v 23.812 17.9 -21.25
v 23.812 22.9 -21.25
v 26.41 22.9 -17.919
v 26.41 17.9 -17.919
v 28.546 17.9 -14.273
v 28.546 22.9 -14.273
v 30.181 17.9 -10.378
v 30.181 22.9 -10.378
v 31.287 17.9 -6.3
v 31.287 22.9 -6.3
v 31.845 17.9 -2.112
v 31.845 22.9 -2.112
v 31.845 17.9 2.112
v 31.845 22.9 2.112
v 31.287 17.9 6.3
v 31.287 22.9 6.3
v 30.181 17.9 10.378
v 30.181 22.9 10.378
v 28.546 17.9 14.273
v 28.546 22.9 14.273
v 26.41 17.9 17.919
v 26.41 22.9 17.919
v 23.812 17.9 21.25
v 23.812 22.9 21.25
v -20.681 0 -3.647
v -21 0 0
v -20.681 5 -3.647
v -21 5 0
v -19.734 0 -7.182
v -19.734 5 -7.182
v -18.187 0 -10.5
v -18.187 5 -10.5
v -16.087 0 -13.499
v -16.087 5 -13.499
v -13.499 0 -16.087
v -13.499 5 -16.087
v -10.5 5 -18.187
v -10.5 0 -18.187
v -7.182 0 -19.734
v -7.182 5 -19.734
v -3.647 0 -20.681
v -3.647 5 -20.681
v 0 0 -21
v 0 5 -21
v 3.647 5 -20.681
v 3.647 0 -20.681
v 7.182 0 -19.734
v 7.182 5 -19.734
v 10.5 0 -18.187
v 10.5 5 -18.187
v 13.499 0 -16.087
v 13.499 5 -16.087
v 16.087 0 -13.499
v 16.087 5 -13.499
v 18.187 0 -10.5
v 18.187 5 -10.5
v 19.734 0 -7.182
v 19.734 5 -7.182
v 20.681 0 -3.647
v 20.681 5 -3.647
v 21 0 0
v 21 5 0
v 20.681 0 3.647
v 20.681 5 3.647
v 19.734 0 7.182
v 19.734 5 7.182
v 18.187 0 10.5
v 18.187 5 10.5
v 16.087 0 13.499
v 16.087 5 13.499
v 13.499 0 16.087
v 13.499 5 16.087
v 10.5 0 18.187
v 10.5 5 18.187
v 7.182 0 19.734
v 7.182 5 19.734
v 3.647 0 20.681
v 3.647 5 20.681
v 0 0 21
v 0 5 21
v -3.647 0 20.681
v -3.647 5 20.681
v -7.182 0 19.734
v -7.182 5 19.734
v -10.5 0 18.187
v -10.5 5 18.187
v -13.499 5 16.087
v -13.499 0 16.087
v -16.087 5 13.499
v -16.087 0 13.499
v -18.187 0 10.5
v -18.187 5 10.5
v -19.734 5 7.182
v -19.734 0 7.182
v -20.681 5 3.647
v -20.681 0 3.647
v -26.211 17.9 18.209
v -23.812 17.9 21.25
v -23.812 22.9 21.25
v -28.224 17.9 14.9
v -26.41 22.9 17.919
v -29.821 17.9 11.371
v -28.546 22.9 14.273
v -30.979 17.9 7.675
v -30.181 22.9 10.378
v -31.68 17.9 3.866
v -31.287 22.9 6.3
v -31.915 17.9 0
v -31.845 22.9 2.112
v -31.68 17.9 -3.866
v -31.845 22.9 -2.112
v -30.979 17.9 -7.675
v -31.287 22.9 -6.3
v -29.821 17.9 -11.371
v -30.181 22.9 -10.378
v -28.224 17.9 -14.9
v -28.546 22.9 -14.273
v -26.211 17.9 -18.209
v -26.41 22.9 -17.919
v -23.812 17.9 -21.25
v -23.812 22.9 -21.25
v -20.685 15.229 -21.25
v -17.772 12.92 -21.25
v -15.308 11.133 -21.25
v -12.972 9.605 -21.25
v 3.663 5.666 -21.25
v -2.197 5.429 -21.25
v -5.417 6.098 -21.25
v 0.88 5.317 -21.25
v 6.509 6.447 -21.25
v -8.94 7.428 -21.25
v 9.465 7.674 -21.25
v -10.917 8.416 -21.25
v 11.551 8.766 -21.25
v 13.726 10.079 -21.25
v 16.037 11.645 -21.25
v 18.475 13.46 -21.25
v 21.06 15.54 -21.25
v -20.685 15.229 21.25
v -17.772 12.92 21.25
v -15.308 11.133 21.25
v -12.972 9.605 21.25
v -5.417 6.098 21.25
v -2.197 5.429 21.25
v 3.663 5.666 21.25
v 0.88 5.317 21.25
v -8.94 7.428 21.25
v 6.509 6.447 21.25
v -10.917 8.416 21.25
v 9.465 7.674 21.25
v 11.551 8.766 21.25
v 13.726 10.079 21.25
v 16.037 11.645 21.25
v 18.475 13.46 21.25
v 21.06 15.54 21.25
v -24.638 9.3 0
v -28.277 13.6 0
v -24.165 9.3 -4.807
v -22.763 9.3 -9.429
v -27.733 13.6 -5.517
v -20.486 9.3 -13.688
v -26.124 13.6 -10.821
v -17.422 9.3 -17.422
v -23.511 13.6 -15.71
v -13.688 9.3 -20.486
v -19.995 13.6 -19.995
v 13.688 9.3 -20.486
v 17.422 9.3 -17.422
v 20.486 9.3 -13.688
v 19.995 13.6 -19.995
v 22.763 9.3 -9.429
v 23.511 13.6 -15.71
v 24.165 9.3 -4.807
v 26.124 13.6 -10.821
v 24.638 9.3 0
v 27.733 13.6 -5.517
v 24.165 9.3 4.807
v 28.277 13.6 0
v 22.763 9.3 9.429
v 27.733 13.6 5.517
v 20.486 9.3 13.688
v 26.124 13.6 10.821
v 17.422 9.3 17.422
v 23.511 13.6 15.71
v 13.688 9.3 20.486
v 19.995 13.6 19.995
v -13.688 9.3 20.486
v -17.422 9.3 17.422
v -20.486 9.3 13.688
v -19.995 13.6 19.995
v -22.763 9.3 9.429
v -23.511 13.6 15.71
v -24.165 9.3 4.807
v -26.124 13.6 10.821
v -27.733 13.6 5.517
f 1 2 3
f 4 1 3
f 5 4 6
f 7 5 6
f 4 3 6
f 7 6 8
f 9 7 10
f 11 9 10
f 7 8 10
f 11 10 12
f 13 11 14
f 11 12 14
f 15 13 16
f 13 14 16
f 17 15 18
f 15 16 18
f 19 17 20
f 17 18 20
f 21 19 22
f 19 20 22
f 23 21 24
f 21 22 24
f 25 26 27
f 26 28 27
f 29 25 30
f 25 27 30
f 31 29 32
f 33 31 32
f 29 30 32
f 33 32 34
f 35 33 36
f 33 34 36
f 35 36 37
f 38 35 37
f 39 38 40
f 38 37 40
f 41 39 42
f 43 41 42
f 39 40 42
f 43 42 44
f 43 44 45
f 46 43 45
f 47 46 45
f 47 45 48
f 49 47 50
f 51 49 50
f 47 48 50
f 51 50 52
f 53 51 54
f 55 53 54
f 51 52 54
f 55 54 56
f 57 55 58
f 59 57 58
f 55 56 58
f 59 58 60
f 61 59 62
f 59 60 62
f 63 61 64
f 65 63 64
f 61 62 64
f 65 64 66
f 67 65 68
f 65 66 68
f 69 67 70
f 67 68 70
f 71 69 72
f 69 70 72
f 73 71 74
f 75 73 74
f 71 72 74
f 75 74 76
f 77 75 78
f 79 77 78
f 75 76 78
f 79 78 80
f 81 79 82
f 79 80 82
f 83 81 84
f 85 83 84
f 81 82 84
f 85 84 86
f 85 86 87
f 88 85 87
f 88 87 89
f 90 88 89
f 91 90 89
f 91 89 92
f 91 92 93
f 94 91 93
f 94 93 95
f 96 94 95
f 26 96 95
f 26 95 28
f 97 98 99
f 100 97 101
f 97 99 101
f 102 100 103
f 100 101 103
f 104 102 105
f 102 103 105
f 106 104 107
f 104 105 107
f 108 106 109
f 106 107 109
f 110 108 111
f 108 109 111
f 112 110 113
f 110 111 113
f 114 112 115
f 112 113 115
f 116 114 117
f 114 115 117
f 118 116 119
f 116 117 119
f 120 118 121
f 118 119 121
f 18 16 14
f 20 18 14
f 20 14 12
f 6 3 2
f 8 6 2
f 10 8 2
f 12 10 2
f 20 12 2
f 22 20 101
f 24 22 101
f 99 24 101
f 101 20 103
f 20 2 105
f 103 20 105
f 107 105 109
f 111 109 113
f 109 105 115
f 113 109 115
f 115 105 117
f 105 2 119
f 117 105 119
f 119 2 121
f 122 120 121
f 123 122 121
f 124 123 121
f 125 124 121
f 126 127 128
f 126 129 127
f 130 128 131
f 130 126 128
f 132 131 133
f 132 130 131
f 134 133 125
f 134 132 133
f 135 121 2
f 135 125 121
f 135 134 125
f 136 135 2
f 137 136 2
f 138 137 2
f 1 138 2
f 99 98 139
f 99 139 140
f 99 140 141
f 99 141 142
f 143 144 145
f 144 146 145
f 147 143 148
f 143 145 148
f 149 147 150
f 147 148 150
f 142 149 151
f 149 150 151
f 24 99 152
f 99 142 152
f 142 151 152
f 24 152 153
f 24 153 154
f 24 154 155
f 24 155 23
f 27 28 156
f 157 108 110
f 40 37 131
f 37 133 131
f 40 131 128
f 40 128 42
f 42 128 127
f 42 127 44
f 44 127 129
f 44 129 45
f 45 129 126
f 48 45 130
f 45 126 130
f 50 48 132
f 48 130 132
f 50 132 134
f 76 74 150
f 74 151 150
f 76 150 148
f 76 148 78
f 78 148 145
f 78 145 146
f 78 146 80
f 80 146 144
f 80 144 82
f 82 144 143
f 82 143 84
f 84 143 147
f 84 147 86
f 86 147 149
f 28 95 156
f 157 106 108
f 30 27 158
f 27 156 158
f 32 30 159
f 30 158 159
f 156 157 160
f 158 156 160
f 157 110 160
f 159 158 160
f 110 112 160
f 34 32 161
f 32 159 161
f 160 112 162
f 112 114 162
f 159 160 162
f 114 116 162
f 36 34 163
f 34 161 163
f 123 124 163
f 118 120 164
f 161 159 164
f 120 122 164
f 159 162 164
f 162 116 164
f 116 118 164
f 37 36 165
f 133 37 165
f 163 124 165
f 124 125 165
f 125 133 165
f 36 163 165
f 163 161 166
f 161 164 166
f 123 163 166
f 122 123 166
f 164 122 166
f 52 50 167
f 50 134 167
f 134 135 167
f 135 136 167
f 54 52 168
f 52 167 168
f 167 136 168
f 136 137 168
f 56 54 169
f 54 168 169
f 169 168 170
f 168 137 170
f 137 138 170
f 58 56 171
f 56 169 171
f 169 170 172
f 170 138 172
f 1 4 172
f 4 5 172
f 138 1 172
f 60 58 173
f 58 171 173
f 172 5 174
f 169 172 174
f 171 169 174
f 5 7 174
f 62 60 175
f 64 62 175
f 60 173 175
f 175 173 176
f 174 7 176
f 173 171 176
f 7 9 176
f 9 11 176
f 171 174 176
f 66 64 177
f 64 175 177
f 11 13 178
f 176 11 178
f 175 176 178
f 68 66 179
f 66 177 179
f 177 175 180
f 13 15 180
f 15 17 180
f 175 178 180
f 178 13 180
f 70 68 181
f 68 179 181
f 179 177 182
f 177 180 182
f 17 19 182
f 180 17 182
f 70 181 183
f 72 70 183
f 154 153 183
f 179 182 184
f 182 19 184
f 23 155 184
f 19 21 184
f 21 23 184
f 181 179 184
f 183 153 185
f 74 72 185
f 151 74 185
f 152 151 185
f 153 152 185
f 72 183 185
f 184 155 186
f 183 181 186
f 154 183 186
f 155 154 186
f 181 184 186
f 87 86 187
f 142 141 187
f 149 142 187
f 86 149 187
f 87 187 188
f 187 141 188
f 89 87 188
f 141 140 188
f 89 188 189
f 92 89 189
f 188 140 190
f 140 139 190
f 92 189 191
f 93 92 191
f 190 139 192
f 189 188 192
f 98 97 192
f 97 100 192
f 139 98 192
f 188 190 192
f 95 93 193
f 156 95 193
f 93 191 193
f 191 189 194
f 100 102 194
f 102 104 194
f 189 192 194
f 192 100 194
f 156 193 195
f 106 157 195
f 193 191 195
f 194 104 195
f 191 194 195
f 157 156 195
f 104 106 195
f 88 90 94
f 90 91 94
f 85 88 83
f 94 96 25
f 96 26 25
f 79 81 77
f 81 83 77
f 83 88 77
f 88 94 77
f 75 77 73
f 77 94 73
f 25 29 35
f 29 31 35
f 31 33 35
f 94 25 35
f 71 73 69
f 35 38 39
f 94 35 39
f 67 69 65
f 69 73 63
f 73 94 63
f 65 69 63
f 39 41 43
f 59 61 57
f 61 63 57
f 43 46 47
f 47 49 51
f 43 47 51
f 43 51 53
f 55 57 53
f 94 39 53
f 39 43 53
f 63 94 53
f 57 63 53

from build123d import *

# Parameters (mm, degrees)
SKETCH2_W          = 47.62425259
SKETCH2_H          = 10.665197925
CUT_EXTRUDE2_DEPTH = 23.9


with BuildPart() as part:
    # Sketch1 → Revolve1 (revolve)
    with BuildSketch(Plane.XY):
        Polygon((0, 0), (-21, 0), (-21, 5), (-31.91519793, 17.9), (-31.91519793, 22.9), (0, 22.9), align=None)
    revolve(axis=Axis((0, 22.9, 0), (0, -1, 0)))

    # Sketch2 → Cut-Extrude2 (cut, through all)
    with BuildSketch(Plane(origin=(0, 0, 0), x_dir=(1, 0, 0), z_dir=(0, 1, 0))):
        with Locations((0, 26.582598968)):
            Rectangle(SKETCH2_W, SKETCH2_H)
        with Locations((0, -26.582598968)):
            Rectangle(SKETCH2_W, SKETCH2_H)
    extrude(amount=CUT_EXTRUDE2_DEPTH, mode=Mode.SUBTRACT)


solid = part.part
